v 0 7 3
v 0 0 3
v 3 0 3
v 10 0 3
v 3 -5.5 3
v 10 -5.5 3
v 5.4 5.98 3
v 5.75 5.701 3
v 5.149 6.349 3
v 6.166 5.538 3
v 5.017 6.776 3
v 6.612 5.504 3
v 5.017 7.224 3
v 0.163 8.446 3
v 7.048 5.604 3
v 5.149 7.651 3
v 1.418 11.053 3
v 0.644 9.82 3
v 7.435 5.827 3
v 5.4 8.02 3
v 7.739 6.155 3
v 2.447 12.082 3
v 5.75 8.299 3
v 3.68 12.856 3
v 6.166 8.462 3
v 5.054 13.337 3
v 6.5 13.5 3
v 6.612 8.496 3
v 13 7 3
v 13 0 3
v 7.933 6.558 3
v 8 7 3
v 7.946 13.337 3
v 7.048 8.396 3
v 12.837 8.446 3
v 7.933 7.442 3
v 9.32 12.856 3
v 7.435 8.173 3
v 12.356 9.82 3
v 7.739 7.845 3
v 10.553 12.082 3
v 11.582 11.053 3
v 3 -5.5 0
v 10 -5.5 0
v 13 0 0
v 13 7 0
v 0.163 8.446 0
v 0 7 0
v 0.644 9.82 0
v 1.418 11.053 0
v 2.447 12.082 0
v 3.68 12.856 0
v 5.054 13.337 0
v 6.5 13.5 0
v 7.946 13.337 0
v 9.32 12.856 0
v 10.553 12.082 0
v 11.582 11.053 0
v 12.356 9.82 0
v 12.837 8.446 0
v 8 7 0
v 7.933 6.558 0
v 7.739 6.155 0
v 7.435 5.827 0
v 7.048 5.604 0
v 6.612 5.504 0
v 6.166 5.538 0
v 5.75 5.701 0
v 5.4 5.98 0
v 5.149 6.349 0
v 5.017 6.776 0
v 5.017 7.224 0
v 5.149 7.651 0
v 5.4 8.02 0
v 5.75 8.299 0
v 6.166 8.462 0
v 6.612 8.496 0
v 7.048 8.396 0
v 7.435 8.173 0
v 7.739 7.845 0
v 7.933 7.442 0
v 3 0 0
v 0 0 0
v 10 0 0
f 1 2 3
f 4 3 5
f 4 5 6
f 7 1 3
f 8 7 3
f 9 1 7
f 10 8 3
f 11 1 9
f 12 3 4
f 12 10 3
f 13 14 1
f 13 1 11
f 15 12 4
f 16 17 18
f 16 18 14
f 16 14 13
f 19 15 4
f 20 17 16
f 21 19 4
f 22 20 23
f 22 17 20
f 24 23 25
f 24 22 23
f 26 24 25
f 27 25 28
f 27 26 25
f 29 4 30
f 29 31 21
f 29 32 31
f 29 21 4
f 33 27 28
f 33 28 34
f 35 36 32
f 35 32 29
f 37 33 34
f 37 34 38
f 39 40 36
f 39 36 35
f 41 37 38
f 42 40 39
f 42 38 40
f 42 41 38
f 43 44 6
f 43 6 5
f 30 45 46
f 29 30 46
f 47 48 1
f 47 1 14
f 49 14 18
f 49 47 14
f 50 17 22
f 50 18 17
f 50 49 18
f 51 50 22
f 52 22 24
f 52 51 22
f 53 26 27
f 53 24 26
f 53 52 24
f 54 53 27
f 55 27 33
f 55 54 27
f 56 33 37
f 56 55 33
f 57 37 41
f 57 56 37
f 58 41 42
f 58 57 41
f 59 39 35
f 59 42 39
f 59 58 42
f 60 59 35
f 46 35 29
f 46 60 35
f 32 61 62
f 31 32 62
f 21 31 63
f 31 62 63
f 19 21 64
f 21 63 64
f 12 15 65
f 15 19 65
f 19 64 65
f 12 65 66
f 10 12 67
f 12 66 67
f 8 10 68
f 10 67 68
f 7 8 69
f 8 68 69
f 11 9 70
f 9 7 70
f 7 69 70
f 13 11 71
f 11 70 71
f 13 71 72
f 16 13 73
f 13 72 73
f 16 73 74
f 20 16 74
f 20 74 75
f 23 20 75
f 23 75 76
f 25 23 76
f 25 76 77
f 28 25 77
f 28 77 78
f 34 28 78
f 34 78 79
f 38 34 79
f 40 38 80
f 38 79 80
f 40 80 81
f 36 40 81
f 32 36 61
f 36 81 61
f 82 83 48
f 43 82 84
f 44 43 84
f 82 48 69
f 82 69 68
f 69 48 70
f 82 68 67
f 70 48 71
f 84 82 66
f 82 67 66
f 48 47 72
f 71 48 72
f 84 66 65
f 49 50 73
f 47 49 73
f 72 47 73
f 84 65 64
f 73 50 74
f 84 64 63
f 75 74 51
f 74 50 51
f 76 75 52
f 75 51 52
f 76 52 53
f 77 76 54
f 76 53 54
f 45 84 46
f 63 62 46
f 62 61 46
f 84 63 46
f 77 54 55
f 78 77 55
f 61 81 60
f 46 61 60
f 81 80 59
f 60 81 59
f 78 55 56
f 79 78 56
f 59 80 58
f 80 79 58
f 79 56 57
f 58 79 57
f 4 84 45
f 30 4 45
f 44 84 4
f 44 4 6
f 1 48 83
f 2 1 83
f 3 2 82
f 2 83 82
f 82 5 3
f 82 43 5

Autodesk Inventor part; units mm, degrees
ref_plane "YZ Plane" through (0, 0, 0) normal (1, 0, 0) x (0, 1, 0)
ref_plane "XZ Plane" through (0, 0, 0) normal (0, 1, 0) x (-1, 0, 0)
ref_plane "XY Plane" through (0, 0, 0) normal (0, 0, 1) x (1, 0, 0)
sketch "Sketch1" plane through (0, 0, 0) normal (0, 0, 1) x (1, 0, 0)
  line L0 (13, 0) -> (13, 7)
  line L1 (0, 7) -> (0, 0)
  arc A0 (13, 7) -> (0, 7) centre (6.5, 7) ccw
  line L2 (10, 0) -> (10, -5.5)
  line L3 (10, -5.5) -> (3, -5.5)
  line L4 (3, -5.5) -> (3, 0)
  line L5 (0, 0) -> (3, 0)
  line L6 (10, 0) -> (13, 0)
  circle A1 centre (6.5, 7) radius 1.5
  dimension "d0" = 7
  dimension "d1" = 3
  dimension "d2" = 3
  dimension "d3" = 7
  dimension "d7" = 3
  dimension "d10" = 5.5
  dimension "d11" = 7
extrude "Extrusion2" add sketch "Sketch1" along normal blind 3
properties part number "Gripper V 6.0 base tab 3mm"
